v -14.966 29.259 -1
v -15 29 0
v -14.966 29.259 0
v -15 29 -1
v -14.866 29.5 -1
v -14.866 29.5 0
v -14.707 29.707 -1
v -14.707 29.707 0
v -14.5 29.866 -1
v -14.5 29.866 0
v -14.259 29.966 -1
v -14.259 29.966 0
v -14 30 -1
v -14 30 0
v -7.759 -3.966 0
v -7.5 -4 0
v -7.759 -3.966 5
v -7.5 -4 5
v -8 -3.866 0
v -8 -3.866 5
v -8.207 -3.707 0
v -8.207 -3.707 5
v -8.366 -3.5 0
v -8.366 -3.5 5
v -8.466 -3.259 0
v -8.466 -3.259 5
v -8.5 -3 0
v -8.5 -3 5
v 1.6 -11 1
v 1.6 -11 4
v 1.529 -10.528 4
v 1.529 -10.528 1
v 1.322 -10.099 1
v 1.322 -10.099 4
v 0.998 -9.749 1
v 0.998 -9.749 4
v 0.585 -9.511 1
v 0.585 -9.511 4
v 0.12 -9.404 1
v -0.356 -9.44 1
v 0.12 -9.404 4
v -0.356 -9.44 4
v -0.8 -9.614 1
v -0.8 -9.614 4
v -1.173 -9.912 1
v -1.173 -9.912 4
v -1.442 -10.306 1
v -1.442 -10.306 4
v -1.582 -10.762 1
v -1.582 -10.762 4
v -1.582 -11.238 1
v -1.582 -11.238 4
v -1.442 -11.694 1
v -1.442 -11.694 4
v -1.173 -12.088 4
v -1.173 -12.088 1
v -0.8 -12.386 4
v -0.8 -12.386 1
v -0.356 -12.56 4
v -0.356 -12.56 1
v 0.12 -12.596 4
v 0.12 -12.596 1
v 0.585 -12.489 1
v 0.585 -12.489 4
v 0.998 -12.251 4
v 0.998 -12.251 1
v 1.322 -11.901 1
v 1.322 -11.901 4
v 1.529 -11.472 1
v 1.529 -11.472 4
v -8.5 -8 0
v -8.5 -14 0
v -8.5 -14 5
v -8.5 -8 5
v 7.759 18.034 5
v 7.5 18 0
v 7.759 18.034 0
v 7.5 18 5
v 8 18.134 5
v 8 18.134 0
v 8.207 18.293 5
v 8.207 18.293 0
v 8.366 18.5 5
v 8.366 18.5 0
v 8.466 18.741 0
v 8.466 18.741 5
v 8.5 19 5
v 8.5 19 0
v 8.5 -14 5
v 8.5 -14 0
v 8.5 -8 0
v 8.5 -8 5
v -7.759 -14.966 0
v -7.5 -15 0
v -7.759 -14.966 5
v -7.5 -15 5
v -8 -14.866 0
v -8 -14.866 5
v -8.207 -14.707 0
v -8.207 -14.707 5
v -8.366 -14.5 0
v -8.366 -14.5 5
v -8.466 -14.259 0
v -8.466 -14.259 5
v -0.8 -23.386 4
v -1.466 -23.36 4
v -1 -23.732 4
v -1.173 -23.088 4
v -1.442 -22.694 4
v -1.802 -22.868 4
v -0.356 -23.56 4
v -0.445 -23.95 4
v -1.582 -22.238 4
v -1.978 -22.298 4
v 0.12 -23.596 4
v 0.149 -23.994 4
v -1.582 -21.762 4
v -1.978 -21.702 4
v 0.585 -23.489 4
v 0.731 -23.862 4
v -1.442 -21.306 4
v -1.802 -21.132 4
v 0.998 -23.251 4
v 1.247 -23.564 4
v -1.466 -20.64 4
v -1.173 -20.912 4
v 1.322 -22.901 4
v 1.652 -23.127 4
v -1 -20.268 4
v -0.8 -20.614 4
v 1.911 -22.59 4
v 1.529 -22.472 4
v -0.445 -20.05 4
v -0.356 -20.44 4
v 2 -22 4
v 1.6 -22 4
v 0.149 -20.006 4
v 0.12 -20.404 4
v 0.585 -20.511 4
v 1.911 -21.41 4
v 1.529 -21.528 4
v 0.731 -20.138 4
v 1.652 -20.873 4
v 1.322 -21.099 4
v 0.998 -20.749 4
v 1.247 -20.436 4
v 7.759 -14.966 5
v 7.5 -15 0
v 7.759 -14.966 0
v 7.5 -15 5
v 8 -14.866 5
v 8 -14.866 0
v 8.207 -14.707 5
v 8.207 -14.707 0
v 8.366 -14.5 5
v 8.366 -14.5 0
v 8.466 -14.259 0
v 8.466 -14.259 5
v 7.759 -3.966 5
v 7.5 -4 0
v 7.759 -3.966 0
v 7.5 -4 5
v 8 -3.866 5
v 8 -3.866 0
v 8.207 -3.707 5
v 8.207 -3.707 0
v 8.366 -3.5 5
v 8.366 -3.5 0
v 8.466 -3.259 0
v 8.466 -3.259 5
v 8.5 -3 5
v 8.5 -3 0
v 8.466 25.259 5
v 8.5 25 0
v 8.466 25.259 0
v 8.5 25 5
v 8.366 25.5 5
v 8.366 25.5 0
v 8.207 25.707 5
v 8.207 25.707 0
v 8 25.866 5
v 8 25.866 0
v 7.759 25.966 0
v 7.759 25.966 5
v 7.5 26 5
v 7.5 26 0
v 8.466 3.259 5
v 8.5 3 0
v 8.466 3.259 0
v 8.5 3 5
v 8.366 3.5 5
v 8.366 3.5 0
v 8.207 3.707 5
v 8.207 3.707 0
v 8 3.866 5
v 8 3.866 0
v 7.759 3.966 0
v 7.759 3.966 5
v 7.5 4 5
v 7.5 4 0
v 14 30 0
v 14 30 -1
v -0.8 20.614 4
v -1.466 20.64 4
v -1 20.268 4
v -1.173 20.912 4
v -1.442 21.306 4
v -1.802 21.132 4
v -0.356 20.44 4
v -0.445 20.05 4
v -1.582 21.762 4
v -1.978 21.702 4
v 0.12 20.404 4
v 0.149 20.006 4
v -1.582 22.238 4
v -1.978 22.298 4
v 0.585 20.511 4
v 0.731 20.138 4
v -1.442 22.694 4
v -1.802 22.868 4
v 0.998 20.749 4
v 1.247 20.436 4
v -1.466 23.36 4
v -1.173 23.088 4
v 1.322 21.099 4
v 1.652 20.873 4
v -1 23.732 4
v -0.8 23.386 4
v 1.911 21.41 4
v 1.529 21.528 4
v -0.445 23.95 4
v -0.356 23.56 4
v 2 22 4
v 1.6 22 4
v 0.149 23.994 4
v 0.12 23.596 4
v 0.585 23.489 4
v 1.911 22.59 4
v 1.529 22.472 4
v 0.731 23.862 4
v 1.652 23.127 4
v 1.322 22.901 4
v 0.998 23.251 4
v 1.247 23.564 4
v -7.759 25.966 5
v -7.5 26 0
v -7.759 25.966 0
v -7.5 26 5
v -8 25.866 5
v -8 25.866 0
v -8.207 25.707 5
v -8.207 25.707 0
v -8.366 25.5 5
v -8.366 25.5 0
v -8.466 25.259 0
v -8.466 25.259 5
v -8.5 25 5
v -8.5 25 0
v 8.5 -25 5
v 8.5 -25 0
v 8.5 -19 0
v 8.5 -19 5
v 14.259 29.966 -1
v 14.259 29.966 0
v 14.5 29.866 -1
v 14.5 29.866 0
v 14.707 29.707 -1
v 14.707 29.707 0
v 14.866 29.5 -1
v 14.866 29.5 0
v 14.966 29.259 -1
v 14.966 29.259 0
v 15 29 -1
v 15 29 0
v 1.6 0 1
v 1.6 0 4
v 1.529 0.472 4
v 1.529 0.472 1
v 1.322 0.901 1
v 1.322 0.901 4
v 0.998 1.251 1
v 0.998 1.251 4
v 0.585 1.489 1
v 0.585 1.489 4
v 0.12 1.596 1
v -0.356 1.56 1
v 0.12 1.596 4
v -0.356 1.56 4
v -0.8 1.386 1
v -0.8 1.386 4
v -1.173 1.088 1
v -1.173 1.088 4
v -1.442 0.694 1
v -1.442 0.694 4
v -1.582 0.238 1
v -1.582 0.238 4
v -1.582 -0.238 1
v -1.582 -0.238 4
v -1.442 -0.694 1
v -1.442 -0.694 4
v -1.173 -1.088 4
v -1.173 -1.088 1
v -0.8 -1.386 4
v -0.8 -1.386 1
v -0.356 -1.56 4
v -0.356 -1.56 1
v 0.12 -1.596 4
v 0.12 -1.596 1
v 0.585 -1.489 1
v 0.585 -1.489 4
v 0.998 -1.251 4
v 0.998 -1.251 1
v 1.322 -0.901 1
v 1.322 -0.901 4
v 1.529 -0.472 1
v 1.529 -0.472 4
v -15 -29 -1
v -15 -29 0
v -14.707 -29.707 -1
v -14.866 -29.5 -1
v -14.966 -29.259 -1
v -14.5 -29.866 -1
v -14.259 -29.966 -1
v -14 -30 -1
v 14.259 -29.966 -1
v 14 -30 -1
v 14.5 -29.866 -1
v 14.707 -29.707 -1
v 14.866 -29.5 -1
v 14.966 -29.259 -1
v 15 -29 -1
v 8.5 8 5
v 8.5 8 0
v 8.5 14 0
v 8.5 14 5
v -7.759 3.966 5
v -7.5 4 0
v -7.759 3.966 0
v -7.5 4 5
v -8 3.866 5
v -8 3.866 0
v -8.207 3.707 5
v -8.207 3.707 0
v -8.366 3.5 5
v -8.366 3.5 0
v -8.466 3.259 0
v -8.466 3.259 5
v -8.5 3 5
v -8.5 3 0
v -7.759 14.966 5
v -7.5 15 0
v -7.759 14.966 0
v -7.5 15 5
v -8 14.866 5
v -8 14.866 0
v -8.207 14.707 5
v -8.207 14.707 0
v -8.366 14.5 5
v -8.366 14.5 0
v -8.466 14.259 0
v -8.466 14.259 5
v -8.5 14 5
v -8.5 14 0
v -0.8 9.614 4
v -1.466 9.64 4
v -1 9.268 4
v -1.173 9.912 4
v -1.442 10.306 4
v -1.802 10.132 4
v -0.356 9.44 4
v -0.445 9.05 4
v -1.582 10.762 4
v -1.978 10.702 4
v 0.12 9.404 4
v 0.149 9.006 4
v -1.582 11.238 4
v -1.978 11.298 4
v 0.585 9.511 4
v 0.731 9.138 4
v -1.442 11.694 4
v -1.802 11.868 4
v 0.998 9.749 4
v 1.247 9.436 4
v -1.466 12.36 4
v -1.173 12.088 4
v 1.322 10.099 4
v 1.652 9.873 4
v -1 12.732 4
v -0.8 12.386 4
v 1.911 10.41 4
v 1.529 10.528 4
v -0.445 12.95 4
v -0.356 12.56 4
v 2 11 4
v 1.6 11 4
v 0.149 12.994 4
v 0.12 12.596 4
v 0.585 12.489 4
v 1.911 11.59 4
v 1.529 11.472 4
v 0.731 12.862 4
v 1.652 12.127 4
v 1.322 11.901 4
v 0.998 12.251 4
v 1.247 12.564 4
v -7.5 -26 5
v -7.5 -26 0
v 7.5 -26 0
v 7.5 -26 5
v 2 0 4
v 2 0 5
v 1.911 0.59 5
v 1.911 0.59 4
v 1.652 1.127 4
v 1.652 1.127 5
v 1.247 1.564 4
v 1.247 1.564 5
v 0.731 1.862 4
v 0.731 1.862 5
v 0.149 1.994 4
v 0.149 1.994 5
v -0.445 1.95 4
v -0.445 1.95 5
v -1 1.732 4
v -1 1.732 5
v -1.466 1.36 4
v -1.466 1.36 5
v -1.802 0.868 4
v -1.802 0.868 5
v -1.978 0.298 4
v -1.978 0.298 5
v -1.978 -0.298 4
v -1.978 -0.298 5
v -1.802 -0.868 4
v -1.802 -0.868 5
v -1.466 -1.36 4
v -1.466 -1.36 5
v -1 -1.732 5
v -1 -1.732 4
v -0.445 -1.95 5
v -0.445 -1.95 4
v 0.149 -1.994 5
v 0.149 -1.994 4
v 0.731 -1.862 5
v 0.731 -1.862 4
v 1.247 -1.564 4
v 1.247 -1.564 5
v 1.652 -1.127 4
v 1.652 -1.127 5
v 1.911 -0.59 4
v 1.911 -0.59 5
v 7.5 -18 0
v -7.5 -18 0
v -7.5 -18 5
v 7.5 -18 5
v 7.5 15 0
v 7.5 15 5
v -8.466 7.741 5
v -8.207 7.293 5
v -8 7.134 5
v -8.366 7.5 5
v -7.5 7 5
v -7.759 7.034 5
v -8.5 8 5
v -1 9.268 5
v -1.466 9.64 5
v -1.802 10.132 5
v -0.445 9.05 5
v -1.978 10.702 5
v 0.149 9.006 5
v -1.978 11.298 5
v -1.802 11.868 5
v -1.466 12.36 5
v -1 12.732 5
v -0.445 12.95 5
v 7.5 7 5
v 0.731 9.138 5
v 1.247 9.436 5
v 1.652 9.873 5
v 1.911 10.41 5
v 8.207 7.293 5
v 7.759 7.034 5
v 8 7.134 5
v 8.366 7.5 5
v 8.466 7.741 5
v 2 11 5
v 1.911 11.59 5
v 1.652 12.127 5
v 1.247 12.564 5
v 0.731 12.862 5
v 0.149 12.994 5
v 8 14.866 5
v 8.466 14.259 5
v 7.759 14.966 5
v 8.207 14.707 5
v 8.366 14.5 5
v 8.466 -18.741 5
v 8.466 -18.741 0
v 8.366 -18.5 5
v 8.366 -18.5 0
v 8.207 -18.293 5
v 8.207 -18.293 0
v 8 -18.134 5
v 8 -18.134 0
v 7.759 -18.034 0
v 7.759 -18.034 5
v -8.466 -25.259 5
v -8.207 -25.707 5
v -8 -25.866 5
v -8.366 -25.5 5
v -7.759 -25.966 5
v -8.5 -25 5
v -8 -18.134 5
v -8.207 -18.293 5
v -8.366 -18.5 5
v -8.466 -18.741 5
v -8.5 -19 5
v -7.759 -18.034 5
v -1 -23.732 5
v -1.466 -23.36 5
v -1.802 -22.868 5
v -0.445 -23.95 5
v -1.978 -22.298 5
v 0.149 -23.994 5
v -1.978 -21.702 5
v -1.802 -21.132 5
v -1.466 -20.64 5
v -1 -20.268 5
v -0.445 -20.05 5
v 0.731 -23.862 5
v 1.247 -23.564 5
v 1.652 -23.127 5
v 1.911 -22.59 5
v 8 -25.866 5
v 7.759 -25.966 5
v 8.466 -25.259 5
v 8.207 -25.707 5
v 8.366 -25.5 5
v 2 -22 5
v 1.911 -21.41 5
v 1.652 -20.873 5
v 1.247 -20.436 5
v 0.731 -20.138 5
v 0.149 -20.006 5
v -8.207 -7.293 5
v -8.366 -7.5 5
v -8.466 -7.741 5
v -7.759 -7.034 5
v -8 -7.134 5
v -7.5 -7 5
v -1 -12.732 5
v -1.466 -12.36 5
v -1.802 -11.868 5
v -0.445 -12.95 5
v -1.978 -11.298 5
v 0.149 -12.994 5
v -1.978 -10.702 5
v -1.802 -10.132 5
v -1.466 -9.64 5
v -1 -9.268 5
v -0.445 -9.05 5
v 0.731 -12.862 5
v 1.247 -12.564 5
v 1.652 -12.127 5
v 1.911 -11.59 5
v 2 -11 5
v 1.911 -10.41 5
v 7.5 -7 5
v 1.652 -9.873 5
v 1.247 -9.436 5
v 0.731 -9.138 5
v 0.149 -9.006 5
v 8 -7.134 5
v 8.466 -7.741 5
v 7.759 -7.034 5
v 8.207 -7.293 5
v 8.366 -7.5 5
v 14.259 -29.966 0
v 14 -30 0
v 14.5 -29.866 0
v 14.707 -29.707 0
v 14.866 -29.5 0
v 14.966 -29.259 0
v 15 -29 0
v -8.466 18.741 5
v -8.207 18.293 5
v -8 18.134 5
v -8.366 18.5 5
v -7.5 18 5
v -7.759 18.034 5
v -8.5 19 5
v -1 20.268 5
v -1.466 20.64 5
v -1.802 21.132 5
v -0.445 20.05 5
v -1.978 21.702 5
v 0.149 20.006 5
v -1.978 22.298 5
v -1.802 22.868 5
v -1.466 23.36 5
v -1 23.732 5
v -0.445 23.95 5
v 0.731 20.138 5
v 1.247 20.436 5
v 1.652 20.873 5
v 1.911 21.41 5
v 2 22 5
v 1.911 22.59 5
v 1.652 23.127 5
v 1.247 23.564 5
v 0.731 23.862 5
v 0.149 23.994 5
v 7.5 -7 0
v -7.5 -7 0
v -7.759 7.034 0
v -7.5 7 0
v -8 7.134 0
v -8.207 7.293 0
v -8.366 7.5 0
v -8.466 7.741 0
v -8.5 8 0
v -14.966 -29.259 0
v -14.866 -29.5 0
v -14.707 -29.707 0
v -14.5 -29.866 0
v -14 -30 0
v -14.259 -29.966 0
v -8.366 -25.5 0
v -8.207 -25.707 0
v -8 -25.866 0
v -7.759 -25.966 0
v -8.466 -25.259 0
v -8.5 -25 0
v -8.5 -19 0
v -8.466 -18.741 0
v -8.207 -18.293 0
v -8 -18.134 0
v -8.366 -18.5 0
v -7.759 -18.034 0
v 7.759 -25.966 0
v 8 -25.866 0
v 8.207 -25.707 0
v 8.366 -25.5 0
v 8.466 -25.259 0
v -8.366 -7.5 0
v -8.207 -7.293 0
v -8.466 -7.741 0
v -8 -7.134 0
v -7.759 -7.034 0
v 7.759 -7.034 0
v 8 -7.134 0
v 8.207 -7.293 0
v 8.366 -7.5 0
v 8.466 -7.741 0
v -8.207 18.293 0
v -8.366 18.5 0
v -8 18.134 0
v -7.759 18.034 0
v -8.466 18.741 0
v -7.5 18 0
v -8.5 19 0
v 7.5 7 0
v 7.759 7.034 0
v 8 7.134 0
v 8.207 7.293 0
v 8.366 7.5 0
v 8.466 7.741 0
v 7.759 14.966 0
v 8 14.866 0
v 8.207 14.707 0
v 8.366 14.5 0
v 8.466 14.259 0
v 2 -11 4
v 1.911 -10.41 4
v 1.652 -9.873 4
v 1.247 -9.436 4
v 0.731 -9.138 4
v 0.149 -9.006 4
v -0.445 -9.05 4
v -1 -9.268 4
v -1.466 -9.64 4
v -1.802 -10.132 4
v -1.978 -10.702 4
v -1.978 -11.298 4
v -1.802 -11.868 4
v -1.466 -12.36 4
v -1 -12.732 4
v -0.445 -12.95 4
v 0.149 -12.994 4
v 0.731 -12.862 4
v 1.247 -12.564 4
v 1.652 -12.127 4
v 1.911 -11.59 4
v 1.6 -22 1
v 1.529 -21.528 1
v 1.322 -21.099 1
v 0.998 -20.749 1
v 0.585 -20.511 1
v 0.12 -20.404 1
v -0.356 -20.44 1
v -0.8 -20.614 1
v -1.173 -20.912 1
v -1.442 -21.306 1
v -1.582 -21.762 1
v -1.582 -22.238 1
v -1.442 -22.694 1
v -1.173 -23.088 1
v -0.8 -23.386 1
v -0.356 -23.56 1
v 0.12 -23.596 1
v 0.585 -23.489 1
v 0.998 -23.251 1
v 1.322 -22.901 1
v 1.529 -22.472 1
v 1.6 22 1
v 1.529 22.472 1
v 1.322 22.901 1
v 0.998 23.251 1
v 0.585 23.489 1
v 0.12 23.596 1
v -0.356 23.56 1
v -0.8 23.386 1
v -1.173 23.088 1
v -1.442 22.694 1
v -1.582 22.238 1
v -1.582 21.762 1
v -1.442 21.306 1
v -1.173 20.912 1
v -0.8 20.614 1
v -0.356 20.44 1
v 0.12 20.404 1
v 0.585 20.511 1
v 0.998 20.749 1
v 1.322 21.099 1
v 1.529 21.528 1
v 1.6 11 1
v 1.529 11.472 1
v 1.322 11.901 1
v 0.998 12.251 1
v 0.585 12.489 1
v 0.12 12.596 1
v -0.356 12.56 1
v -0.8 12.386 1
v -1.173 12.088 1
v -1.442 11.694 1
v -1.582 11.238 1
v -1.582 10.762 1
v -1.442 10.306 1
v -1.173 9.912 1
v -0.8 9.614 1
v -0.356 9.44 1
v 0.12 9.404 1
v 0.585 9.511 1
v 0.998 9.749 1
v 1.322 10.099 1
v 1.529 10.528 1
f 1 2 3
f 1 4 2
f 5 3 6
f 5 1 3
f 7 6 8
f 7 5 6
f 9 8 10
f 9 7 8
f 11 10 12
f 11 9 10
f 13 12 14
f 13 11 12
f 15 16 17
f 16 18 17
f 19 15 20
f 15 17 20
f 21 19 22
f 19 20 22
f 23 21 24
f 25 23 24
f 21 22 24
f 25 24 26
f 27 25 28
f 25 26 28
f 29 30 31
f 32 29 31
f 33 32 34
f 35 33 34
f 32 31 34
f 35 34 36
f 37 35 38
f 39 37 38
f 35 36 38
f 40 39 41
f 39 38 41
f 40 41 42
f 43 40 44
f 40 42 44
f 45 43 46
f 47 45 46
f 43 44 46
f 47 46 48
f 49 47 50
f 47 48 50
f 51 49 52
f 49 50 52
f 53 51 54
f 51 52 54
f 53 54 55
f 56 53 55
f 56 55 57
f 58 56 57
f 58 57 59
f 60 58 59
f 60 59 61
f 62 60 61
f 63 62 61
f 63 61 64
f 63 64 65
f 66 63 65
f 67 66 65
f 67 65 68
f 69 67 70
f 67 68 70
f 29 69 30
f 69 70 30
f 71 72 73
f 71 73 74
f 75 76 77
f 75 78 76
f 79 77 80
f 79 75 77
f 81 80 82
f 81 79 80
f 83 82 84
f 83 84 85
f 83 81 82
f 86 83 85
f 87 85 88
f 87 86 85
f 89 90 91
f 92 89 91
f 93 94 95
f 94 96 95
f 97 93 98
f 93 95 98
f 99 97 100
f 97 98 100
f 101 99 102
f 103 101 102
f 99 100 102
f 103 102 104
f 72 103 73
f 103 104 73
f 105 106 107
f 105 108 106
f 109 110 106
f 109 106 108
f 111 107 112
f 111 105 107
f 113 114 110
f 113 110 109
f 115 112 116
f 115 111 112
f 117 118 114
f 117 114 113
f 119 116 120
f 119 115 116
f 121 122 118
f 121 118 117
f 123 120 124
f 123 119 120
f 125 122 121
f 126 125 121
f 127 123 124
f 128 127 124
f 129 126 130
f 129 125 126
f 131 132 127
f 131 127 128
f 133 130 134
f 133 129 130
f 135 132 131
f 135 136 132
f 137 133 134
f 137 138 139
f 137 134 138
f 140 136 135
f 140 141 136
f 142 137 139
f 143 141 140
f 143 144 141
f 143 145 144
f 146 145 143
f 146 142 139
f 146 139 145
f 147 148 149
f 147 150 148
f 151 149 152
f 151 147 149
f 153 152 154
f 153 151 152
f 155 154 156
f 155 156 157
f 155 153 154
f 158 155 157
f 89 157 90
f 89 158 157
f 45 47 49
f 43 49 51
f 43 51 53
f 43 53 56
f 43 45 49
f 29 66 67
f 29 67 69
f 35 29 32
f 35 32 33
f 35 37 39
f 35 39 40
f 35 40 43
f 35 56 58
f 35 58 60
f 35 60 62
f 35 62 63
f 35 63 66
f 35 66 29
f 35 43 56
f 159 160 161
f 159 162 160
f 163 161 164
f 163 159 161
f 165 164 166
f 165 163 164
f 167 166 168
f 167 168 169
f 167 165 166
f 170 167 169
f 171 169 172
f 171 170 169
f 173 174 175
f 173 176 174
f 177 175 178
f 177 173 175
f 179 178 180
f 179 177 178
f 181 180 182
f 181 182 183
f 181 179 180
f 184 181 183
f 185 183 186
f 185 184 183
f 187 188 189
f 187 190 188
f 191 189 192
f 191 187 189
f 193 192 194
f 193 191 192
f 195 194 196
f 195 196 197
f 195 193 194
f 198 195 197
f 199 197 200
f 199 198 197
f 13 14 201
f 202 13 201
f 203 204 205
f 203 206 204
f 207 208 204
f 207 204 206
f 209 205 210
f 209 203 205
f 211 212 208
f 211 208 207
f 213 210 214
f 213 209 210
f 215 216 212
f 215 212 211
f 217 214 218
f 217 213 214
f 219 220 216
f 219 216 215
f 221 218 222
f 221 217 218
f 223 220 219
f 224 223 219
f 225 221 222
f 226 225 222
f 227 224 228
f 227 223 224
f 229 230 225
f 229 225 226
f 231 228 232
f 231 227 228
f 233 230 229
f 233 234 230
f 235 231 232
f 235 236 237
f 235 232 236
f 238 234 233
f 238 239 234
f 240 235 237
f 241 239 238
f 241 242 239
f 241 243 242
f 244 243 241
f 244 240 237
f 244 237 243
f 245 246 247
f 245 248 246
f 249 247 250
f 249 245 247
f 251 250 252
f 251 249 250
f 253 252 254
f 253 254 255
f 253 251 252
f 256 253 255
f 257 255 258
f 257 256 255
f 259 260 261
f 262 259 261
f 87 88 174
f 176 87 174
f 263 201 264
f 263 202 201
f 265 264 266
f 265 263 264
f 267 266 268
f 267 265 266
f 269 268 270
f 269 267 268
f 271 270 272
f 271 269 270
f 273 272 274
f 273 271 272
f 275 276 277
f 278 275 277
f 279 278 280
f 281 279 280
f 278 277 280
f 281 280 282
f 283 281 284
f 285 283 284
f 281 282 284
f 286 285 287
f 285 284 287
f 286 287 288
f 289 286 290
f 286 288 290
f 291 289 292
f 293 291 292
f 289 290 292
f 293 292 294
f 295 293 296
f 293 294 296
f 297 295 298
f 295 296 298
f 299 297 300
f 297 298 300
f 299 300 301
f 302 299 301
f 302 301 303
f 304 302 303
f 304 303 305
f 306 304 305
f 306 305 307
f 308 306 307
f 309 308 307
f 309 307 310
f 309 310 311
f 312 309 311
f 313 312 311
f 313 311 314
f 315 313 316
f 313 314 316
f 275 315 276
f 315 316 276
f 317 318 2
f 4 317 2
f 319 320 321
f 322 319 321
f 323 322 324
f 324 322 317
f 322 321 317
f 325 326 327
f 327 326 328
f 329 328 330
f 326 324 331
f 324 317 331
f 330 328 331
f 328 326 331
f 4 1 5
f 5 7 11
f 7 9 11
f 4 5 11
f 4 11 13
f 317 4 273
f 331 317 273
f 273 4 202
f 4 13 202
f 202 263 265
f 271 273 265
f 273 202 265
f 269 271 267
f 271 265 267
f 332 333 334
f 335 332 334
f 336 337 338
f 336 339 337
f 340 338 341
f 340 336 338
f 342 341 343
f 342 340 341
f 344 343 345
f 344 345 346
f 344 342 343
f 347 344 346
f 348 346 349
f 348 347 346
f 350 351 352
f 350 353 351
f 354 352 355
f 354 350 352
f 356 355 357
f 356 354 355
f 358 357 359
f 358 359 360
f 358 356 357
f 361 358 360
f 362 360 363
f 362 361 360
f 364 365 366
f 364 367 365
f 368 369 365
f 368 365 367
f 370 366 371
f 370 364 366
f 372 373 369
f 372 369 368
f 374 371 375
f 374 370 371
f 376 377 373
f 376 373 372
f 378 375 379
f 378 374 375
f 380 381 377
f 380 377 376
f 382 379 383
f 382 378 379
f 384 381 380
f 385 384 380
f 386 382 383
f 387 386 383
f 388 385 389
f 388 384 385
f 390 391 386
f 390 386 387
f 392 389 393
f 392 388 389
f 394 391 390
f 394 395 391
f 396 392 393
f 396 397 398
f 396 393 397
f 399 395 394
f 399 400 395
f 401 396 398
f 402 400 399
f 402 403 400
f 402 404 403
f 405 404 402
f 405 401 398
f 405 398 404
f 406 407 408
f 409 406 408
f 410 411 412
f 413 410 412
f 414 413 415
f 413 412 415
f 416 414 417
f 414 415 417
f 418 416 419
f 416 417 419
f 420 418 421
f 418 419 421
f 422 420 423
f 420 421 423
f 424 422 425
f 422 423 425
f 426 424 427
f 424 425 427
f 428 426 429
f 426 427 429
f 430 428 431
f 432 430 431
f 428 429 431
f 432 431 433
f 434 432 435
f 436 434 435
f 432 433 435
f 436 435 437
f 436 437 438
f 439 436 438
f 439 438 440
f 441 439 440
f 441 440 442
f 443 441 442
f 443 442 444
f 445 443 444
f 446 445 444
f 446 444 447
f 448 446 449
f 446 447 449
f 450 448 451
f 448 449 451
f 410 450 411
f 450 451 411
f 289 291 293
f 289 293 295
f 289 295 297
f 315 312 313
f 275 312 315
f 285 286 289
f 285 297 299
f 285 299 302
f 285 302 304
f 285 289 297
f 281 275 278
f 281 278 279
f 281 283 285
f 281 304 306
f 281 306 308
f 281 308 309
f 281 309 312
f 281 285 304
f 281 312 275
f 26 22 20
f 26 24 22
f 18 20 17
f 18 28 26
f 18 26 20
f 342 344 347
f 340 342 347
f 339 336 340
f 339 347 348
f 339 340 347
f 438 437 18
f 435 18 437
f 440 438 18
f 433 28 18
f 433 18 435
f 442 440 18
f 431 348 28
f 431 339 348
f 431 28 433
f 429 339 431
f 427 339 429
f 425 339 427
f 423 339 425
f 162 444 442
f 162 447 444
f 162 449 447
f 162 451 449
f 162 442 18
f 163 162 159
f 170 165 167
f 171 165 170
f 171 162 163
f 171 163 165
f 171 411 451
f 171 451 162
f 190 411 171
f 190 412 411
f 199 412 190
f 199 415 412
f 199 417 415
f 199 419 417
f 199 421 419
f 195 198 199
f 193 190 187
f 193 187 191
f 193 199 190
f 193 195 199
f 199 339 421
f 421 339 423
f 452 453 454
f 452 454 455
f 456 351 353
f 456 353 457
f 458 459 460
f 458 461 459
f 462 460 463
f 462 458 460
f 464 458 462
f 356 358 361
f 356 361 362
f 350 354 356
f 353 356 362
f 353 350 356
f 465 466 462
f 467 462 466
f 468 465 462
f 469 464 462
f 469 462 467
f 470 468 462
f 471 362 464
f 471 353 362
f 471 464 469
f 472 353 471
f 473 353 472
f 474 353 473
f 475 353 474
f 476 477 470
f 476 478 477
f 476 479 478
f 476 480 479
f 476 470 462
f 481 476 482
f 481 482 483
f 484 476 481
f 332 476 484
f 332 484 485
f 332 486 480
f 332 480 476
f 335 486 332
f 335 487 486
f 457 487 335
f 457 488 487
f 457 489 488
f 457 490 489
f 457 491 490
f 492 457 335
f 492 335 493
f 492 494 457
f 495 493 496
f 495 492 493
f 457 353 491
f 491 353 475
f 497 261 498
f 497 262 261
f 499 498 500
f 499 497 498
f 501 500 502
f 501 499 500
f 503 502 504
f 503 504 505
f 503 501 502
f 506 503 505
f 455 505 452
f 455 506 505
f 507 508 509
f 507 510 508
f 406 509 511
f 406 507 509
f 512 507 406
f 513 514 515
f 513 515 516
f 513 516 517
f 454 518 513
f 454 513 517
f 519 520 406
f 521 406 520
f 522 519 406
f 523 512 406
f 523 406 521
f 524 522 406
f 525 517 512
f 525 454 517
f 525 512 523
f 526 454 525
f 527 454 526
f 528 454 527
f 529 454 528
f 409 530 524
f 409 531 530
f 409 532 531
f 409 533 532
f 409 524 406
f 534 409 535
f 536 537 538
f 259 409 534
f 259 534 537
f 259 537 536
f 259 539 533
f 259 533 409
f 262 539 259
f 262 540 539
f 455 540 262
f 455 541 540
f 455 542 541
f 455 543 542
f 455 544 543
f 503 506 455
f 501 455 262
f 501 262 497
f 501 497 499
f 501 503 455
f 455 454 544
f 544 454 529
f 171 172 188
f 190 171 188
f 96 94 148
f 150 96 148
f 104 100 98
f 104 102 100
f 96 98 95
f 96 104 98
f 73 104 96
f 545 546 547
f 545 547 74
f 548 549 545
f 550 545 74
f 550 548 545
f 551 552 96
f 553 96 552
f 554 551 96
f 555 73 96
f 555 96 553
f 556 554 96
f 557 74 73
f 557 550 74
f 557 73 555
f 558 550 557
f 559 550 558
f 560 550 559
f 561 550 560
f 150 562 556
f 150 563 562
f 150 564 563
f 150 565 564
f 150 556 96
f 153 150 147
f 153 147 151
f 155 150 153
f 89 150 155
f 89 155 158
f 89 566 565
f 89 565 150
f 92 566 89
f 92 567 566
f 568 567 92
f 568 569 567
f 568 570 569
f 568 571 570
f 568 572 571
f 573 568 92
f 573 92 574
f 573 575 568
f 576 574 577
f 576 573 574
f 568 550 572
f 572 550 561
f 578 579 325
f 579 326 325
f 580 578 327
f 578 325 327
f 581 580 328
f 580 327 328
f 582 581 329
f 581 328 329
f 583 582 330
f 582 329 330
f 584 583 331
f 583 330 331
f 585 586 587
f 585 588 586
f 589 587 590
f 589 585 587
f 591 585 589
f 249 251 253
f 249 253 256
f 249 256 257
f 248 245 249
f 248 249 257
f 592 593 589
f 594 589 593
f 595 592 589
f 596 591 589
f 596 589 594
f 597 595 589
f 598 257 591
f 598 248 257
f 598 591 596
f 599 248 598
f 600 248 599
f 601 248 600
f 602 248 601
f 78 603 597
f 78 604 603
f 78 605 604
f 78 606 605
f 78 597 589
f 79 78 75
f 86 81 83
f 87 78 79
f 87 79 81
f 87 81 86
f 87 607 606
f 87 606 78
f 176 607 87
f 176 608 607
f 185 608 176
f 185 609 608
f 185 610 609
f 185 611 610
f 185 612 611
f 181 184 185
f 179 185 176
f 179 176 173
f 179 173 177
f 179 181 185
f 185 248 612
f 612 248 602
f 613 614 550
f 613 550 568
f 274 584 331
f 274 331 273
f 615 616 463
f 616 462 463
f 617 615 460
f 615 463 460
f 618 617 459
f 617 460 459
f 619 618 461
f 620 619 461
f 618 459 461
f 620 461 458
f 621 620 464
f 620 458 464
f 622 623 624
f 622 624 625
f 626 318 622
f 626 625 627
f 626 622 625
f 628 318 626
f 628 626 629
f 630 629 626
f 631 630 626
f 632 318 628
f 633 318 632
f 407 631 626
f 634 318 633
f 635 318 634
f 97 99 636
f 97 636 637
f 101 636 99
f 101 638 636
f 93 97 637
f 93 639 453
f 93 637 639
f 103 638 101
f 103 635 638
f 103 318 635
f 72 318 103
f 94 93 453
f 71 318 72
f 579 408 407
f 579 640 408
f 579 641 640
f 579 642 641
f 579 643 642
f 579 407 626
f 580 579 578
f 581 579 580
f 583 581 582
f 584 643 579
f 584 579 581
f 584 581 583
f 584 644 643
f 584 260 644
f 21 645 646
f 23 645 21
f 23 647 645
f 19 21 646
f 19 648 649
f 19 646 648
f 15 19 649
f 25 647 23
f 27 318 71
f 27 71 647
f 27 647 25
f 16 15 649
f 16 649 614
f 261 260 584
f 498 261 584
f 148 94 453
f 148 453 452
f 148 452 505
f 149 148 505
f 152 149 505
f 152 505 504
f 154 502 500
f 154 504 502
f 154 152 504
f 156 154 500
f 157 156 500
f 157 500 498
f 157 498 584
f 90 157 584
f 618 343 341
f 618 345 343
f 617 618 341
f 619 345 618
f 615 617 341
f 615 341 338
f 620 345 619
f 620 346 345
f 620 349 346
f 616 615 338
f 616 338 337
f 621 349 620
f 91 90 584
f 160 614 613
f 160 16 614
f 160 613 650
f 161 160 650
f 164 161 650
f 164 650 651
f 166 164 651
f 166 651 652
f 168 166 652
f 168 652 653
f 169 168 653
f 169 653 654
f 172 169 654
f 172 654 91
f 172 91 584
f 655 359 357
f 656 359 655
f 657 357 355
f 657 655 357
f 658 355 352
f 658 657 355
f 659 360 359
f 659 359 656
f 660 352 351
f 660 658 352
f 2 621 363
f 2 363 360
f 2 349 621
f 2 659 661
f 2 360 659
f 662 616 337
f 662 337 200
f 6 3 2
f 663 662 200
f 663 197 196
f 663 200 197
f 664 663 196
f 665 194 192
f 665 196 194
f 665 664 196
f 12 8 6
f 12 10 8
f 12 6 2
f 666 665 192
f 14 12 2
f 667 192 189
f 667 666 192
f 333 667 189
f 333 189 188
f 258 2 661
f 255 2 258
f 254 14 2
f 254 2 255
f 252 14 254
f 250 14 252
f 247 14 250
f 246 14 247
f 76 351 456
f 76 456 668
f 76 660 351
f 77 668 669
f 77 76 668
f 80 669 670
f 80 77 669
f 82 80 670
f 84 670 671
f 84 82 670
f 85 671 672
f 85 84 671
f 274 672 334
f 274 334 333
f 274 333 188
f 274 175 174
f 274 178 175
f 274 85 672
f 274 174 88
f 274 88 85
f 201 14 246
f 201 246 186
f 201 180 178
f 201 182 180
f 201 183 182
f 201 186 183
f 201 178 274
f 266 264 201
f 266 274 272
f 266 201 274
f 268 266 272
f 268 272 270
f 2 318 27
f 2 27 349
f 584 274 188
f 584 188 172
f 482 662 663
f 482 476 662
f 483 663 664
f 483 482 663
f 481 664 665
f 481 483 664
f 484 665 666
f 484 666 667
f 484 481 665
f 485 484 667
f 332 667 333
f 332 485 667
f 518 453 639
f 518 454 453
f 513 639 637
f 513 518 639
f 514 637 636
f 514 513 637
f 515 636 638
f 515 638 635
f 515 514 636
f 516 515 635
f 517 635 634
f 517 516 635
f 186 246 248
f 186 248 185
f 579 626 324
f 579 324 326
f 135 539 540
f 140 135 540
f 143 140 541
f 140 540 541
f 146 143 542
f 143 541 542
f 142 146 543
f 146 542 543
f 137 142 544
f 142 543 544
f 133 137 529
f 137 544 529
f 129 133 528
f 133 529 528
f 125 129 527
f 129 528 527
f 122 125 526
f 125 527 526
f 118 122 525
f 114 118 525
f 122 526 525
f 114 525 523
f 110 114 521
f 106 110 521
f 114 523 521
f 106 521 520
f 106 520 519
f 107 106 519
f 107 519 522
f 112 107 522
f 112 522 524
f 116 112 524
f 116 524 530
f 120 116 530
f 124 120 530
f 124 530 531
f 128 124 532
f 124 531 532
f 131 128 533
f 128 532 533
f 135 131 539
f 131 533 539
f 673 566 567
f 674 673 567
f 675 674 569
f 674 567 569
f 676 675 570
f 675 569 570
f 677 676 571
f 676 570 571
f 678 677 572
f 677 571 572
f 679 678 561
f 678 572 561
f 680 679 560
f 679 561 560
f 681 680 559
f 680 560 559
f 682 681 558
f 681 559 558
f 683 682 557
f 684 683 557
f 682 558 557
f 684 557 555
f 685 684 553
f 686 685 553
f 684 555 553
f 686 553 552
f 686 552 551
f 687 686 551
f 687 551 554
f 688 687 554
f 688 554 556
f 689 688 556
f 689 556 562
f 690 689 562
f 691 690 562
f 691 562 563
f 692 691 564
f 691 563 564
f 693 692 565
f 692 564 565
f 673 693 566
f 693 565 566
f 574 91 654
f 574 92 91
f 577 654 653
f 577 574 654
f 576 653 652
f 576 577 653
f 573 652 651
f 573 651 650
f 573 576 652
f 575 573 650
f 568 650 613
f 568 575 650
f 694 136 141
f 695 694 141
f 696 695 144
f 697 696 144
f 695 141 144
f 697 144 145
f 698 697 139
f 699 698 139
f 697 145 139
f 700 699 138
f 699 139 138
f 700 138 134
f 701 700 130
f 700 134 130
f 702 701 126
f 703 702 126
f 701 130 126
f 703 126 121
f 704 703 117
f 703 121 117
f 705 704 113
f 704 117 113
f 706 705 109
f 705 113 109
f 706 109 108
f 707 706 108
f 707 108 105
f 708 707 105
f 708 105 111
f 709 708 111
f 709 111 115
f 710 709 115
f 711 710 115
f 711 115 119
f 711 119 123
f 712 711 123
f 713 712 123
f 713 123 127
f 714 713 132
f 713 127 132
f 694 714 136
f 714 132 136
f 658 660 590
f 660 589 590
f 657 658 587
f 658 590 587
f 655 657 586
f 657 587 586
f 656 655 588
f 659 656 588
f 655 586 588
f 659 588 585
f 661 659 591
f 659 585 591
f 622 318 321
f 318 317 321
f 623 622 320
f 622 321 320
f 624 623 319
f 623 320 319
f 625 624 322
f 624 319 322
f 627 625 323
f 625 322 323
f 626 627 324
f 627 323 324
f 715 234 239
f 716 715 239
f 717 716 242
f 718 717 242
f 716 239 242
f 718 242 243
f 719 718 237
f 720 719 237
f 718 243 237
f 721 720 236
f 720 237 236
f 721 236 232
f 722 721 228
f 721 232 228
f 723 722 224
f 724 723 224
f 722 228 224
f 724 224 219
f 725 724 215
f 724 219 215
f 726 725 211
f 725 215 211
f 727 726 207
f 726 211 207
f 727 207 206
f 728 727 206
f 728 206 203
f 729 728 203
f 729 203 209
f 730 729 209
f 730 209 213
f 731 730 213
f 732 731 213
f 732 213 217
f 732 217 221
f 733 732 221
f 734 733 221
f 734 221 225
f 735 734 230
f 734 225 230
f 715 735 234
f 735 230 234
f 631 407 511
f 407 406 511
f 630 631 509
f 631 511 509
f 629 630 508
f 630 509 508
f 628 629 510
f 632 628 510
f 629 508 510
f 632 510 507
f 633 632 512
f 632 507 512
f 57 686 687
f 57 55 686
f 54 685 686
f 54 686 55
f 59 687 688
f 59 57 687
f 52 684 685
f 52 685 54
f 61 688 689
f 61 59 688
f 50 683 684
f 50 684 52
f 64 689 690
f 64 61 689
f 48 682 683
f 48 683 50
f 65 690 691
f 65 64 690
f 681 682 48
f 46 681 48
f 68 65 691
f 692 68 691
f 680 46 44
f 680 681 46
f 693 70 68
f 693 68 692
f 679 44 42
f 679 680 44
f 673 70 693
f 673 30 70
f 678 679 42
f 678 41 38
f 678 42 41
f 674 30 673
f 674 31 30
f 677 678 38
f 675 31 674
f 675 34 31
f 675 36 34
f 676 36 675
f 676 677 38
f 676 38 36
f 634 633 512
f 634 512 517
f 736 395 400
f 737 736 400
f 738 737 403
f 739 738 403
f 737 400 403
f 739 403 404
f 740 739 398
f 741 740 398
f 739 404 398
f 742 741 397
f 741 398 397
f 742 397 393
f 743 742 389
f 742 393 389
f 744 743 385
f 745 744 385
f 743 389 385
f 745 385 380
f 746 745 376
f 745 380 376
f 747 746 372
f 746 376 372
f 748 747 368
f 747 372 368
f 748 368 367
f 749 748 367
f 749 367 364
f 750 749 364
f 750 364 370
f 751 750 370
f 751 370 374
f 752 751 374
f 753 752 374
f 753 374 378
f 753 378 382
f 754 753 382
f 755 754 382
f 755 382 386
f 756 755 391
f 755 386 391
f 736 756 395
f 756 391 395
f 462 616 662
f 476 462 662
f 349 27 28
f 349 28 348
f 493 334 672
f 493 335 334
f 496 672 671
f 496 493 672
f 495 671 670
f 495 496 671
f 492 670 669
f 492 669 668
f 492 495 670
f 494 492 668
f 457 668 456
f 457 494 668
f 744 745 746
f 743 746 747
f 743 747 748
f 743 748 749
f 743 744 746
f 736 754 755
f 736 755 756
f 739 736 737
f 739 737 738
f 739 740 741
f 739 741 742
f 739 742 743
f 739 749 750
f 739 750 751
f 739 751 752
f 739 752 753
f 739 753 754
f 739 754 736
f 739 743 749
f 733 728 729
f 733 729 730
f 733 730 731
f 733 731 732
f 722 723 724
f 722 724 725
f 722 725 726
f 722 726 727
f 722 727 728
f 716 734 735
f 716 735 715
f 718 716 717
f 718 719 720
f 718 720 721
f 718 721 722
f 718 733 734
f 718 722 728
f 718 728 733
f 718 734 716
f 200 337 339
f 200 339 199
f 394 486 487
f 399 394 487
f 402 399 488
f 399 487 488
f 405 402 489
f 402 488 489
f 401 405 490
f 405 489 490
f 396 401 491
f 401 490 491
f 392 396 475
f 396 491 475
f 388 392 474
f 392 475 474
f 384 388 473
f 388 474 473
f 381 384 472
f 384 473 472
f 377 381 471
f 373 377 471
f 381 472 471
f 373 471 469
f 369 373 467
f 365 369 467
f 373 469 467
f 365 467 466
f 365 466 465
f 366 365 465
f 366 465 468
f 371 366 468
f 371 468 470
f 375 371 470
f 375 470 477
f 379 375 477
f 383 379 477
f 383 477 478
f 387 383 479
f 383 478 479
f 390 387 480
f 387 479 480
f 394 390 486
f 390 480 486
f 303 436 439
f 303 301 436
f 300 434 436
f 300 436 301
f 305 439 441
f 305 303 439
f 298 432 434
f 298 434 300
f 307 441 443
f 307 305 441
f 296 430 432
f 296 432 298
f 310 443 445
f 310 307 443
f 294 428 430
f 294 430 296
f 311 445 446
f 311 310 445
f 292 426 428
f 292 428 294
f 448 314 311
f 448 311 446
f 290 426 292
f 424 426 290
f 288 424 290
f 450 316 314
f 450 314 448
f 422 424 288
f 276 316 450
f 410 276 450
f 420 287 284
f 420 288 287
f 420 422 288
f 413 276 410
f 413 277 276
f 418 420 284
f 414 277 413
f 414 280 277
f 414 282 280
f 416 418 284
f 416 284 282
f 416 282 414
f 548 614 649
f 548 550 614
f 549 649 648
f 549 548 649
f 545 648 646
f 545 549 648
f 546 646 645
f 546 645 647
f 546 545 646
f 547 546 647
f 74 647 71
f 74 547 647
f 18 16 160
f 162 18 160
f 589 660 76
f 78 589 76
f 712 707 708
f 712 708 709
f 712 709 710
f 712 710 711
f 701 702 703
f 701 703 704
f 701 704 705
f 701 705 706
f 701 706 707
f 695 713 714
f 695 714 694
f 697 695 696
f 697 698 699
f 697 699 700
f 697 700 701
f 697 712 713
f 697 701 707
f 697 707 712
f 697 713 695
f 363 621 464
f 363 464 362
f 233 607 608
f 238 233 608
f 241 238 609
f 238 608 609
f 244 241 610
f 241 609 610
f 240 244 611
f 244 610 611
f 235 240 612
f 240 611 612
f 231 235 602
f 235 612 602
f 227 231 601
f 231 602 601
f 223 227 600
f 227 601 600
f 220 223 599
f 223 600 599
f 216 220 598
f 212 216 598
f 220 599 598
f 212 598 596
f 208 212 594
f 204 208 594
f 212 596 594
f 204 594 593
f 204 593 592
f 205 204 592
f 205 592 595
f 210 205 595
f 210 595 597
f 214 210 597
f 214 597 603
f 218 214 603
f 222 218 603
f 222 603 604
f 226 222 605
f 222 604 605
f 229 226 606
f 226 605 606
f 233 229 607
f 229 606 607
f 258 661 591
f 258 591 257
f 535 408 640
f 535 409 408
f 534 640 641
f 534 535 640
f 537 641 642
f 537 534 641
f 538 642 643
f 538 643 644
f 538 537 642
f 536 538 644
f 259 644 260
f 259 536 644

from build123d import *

# Parameters (mm, degrees)
F0_W     = 30
F0_H     = 60
F1_DEPTH = 1
F2_W     = 17
F2_H     = 8
F3_DEPTH = 5
F4_R     = 2
F5_DEPTH = 1
F6_R     = 1
F7_R     = 1.6
F8_DEPTH = 3


with BuildPart() as f1:
    # F0 (on Top) → F1 (new body)
    with BuildSketch(Plane.XY):
        Rectangle(F0_W, F0_H)
    extrude(amount=-F1_DEPTH)

    # F2 (on Top) → F3 (join)
    with BuildSketch(Plane.XY):
        Rectangle(F2_W, F2_H)
        with Locations((0, -11)):
            Rectangle(F2_W, F2_H)
        with Locations((0, 11)):
            Rectangle(F2_W, F2_H)
        with Locations((0, -22)):
            Rectangle(F2_W, F2_H)
        with Locations((0, 22)):
            Rectangle(F2_W, F2_H)
    extrude(amount=F3_DEPTH)

    # F4 (on face) → F5 (cut)
    with BuildSketch(Plane.XY.offset(5)):
        Circle(F4_R)
        with Locations((0, 11)):
            Circle(F4_R)
        with Locations((0, 22)):
            Circle(F4_R)
        with Locations((0, -11)):
            Circle(F4_R)
        with Locations((0, -22)):
            Circle(F4_R)
    extrude(amount=-F5_DEPTH, mode=Mode.SUBTRACT)

    # F6
    f6_edges = [f1.edges().sort_by_distance(p)[0] for p in [
        (-8.5, 4, 2.5),
        (8.5, 4, 2.5),
        (8.5, -4, 2.5),
        (-8.5, -4, 2.5),
        (-15, 30, -0.5),
        (15, 30, -0.5),
        (15, -30, -0.5),
        (-15, -30, -0.5),
        (-8.5, -26, 2.5),
        (-8.5, -15, 2.5),
        (-8.5, -7, 2.5),
        (-8.5, 7, 2.5),
        (-8.5, 15, 2.5),
        (-8.5, 18, 2.5),
        (-8.5, 26, 2.5),
        (-8.5, -18, 2.5),
        (8.5, -26, 2.5),
        (8.5, -18, 2.5),
        (8.5, -15, 2.5),
        (8.5, -7, 2.5),
        (8.5, 7, 2.5),
        (8.5, 15, 2.5),
        (8.5, 18, 2.5),
        (8.5, 26, 2.5),
    ]]
    fillet(f6_edges, radius=F6_R)

    # F7 (on face) → F8 (cut)
    with BuildSketch(Plane.XY.offset(4)):
        Circle(F7_R)
        with Locations((0, -11)):
            Circle(F7_R)
        with Locations((0, -22)):
            Circle(F7_R)
        with Locations((0, 11)):
            Circle(F7_R)
        with Locations((0, 22)):
            Circle(F7_R)
    extrude(amount=-F8_DEPTH, mode=Mode.SUBTRACT)


solid = f1.part
